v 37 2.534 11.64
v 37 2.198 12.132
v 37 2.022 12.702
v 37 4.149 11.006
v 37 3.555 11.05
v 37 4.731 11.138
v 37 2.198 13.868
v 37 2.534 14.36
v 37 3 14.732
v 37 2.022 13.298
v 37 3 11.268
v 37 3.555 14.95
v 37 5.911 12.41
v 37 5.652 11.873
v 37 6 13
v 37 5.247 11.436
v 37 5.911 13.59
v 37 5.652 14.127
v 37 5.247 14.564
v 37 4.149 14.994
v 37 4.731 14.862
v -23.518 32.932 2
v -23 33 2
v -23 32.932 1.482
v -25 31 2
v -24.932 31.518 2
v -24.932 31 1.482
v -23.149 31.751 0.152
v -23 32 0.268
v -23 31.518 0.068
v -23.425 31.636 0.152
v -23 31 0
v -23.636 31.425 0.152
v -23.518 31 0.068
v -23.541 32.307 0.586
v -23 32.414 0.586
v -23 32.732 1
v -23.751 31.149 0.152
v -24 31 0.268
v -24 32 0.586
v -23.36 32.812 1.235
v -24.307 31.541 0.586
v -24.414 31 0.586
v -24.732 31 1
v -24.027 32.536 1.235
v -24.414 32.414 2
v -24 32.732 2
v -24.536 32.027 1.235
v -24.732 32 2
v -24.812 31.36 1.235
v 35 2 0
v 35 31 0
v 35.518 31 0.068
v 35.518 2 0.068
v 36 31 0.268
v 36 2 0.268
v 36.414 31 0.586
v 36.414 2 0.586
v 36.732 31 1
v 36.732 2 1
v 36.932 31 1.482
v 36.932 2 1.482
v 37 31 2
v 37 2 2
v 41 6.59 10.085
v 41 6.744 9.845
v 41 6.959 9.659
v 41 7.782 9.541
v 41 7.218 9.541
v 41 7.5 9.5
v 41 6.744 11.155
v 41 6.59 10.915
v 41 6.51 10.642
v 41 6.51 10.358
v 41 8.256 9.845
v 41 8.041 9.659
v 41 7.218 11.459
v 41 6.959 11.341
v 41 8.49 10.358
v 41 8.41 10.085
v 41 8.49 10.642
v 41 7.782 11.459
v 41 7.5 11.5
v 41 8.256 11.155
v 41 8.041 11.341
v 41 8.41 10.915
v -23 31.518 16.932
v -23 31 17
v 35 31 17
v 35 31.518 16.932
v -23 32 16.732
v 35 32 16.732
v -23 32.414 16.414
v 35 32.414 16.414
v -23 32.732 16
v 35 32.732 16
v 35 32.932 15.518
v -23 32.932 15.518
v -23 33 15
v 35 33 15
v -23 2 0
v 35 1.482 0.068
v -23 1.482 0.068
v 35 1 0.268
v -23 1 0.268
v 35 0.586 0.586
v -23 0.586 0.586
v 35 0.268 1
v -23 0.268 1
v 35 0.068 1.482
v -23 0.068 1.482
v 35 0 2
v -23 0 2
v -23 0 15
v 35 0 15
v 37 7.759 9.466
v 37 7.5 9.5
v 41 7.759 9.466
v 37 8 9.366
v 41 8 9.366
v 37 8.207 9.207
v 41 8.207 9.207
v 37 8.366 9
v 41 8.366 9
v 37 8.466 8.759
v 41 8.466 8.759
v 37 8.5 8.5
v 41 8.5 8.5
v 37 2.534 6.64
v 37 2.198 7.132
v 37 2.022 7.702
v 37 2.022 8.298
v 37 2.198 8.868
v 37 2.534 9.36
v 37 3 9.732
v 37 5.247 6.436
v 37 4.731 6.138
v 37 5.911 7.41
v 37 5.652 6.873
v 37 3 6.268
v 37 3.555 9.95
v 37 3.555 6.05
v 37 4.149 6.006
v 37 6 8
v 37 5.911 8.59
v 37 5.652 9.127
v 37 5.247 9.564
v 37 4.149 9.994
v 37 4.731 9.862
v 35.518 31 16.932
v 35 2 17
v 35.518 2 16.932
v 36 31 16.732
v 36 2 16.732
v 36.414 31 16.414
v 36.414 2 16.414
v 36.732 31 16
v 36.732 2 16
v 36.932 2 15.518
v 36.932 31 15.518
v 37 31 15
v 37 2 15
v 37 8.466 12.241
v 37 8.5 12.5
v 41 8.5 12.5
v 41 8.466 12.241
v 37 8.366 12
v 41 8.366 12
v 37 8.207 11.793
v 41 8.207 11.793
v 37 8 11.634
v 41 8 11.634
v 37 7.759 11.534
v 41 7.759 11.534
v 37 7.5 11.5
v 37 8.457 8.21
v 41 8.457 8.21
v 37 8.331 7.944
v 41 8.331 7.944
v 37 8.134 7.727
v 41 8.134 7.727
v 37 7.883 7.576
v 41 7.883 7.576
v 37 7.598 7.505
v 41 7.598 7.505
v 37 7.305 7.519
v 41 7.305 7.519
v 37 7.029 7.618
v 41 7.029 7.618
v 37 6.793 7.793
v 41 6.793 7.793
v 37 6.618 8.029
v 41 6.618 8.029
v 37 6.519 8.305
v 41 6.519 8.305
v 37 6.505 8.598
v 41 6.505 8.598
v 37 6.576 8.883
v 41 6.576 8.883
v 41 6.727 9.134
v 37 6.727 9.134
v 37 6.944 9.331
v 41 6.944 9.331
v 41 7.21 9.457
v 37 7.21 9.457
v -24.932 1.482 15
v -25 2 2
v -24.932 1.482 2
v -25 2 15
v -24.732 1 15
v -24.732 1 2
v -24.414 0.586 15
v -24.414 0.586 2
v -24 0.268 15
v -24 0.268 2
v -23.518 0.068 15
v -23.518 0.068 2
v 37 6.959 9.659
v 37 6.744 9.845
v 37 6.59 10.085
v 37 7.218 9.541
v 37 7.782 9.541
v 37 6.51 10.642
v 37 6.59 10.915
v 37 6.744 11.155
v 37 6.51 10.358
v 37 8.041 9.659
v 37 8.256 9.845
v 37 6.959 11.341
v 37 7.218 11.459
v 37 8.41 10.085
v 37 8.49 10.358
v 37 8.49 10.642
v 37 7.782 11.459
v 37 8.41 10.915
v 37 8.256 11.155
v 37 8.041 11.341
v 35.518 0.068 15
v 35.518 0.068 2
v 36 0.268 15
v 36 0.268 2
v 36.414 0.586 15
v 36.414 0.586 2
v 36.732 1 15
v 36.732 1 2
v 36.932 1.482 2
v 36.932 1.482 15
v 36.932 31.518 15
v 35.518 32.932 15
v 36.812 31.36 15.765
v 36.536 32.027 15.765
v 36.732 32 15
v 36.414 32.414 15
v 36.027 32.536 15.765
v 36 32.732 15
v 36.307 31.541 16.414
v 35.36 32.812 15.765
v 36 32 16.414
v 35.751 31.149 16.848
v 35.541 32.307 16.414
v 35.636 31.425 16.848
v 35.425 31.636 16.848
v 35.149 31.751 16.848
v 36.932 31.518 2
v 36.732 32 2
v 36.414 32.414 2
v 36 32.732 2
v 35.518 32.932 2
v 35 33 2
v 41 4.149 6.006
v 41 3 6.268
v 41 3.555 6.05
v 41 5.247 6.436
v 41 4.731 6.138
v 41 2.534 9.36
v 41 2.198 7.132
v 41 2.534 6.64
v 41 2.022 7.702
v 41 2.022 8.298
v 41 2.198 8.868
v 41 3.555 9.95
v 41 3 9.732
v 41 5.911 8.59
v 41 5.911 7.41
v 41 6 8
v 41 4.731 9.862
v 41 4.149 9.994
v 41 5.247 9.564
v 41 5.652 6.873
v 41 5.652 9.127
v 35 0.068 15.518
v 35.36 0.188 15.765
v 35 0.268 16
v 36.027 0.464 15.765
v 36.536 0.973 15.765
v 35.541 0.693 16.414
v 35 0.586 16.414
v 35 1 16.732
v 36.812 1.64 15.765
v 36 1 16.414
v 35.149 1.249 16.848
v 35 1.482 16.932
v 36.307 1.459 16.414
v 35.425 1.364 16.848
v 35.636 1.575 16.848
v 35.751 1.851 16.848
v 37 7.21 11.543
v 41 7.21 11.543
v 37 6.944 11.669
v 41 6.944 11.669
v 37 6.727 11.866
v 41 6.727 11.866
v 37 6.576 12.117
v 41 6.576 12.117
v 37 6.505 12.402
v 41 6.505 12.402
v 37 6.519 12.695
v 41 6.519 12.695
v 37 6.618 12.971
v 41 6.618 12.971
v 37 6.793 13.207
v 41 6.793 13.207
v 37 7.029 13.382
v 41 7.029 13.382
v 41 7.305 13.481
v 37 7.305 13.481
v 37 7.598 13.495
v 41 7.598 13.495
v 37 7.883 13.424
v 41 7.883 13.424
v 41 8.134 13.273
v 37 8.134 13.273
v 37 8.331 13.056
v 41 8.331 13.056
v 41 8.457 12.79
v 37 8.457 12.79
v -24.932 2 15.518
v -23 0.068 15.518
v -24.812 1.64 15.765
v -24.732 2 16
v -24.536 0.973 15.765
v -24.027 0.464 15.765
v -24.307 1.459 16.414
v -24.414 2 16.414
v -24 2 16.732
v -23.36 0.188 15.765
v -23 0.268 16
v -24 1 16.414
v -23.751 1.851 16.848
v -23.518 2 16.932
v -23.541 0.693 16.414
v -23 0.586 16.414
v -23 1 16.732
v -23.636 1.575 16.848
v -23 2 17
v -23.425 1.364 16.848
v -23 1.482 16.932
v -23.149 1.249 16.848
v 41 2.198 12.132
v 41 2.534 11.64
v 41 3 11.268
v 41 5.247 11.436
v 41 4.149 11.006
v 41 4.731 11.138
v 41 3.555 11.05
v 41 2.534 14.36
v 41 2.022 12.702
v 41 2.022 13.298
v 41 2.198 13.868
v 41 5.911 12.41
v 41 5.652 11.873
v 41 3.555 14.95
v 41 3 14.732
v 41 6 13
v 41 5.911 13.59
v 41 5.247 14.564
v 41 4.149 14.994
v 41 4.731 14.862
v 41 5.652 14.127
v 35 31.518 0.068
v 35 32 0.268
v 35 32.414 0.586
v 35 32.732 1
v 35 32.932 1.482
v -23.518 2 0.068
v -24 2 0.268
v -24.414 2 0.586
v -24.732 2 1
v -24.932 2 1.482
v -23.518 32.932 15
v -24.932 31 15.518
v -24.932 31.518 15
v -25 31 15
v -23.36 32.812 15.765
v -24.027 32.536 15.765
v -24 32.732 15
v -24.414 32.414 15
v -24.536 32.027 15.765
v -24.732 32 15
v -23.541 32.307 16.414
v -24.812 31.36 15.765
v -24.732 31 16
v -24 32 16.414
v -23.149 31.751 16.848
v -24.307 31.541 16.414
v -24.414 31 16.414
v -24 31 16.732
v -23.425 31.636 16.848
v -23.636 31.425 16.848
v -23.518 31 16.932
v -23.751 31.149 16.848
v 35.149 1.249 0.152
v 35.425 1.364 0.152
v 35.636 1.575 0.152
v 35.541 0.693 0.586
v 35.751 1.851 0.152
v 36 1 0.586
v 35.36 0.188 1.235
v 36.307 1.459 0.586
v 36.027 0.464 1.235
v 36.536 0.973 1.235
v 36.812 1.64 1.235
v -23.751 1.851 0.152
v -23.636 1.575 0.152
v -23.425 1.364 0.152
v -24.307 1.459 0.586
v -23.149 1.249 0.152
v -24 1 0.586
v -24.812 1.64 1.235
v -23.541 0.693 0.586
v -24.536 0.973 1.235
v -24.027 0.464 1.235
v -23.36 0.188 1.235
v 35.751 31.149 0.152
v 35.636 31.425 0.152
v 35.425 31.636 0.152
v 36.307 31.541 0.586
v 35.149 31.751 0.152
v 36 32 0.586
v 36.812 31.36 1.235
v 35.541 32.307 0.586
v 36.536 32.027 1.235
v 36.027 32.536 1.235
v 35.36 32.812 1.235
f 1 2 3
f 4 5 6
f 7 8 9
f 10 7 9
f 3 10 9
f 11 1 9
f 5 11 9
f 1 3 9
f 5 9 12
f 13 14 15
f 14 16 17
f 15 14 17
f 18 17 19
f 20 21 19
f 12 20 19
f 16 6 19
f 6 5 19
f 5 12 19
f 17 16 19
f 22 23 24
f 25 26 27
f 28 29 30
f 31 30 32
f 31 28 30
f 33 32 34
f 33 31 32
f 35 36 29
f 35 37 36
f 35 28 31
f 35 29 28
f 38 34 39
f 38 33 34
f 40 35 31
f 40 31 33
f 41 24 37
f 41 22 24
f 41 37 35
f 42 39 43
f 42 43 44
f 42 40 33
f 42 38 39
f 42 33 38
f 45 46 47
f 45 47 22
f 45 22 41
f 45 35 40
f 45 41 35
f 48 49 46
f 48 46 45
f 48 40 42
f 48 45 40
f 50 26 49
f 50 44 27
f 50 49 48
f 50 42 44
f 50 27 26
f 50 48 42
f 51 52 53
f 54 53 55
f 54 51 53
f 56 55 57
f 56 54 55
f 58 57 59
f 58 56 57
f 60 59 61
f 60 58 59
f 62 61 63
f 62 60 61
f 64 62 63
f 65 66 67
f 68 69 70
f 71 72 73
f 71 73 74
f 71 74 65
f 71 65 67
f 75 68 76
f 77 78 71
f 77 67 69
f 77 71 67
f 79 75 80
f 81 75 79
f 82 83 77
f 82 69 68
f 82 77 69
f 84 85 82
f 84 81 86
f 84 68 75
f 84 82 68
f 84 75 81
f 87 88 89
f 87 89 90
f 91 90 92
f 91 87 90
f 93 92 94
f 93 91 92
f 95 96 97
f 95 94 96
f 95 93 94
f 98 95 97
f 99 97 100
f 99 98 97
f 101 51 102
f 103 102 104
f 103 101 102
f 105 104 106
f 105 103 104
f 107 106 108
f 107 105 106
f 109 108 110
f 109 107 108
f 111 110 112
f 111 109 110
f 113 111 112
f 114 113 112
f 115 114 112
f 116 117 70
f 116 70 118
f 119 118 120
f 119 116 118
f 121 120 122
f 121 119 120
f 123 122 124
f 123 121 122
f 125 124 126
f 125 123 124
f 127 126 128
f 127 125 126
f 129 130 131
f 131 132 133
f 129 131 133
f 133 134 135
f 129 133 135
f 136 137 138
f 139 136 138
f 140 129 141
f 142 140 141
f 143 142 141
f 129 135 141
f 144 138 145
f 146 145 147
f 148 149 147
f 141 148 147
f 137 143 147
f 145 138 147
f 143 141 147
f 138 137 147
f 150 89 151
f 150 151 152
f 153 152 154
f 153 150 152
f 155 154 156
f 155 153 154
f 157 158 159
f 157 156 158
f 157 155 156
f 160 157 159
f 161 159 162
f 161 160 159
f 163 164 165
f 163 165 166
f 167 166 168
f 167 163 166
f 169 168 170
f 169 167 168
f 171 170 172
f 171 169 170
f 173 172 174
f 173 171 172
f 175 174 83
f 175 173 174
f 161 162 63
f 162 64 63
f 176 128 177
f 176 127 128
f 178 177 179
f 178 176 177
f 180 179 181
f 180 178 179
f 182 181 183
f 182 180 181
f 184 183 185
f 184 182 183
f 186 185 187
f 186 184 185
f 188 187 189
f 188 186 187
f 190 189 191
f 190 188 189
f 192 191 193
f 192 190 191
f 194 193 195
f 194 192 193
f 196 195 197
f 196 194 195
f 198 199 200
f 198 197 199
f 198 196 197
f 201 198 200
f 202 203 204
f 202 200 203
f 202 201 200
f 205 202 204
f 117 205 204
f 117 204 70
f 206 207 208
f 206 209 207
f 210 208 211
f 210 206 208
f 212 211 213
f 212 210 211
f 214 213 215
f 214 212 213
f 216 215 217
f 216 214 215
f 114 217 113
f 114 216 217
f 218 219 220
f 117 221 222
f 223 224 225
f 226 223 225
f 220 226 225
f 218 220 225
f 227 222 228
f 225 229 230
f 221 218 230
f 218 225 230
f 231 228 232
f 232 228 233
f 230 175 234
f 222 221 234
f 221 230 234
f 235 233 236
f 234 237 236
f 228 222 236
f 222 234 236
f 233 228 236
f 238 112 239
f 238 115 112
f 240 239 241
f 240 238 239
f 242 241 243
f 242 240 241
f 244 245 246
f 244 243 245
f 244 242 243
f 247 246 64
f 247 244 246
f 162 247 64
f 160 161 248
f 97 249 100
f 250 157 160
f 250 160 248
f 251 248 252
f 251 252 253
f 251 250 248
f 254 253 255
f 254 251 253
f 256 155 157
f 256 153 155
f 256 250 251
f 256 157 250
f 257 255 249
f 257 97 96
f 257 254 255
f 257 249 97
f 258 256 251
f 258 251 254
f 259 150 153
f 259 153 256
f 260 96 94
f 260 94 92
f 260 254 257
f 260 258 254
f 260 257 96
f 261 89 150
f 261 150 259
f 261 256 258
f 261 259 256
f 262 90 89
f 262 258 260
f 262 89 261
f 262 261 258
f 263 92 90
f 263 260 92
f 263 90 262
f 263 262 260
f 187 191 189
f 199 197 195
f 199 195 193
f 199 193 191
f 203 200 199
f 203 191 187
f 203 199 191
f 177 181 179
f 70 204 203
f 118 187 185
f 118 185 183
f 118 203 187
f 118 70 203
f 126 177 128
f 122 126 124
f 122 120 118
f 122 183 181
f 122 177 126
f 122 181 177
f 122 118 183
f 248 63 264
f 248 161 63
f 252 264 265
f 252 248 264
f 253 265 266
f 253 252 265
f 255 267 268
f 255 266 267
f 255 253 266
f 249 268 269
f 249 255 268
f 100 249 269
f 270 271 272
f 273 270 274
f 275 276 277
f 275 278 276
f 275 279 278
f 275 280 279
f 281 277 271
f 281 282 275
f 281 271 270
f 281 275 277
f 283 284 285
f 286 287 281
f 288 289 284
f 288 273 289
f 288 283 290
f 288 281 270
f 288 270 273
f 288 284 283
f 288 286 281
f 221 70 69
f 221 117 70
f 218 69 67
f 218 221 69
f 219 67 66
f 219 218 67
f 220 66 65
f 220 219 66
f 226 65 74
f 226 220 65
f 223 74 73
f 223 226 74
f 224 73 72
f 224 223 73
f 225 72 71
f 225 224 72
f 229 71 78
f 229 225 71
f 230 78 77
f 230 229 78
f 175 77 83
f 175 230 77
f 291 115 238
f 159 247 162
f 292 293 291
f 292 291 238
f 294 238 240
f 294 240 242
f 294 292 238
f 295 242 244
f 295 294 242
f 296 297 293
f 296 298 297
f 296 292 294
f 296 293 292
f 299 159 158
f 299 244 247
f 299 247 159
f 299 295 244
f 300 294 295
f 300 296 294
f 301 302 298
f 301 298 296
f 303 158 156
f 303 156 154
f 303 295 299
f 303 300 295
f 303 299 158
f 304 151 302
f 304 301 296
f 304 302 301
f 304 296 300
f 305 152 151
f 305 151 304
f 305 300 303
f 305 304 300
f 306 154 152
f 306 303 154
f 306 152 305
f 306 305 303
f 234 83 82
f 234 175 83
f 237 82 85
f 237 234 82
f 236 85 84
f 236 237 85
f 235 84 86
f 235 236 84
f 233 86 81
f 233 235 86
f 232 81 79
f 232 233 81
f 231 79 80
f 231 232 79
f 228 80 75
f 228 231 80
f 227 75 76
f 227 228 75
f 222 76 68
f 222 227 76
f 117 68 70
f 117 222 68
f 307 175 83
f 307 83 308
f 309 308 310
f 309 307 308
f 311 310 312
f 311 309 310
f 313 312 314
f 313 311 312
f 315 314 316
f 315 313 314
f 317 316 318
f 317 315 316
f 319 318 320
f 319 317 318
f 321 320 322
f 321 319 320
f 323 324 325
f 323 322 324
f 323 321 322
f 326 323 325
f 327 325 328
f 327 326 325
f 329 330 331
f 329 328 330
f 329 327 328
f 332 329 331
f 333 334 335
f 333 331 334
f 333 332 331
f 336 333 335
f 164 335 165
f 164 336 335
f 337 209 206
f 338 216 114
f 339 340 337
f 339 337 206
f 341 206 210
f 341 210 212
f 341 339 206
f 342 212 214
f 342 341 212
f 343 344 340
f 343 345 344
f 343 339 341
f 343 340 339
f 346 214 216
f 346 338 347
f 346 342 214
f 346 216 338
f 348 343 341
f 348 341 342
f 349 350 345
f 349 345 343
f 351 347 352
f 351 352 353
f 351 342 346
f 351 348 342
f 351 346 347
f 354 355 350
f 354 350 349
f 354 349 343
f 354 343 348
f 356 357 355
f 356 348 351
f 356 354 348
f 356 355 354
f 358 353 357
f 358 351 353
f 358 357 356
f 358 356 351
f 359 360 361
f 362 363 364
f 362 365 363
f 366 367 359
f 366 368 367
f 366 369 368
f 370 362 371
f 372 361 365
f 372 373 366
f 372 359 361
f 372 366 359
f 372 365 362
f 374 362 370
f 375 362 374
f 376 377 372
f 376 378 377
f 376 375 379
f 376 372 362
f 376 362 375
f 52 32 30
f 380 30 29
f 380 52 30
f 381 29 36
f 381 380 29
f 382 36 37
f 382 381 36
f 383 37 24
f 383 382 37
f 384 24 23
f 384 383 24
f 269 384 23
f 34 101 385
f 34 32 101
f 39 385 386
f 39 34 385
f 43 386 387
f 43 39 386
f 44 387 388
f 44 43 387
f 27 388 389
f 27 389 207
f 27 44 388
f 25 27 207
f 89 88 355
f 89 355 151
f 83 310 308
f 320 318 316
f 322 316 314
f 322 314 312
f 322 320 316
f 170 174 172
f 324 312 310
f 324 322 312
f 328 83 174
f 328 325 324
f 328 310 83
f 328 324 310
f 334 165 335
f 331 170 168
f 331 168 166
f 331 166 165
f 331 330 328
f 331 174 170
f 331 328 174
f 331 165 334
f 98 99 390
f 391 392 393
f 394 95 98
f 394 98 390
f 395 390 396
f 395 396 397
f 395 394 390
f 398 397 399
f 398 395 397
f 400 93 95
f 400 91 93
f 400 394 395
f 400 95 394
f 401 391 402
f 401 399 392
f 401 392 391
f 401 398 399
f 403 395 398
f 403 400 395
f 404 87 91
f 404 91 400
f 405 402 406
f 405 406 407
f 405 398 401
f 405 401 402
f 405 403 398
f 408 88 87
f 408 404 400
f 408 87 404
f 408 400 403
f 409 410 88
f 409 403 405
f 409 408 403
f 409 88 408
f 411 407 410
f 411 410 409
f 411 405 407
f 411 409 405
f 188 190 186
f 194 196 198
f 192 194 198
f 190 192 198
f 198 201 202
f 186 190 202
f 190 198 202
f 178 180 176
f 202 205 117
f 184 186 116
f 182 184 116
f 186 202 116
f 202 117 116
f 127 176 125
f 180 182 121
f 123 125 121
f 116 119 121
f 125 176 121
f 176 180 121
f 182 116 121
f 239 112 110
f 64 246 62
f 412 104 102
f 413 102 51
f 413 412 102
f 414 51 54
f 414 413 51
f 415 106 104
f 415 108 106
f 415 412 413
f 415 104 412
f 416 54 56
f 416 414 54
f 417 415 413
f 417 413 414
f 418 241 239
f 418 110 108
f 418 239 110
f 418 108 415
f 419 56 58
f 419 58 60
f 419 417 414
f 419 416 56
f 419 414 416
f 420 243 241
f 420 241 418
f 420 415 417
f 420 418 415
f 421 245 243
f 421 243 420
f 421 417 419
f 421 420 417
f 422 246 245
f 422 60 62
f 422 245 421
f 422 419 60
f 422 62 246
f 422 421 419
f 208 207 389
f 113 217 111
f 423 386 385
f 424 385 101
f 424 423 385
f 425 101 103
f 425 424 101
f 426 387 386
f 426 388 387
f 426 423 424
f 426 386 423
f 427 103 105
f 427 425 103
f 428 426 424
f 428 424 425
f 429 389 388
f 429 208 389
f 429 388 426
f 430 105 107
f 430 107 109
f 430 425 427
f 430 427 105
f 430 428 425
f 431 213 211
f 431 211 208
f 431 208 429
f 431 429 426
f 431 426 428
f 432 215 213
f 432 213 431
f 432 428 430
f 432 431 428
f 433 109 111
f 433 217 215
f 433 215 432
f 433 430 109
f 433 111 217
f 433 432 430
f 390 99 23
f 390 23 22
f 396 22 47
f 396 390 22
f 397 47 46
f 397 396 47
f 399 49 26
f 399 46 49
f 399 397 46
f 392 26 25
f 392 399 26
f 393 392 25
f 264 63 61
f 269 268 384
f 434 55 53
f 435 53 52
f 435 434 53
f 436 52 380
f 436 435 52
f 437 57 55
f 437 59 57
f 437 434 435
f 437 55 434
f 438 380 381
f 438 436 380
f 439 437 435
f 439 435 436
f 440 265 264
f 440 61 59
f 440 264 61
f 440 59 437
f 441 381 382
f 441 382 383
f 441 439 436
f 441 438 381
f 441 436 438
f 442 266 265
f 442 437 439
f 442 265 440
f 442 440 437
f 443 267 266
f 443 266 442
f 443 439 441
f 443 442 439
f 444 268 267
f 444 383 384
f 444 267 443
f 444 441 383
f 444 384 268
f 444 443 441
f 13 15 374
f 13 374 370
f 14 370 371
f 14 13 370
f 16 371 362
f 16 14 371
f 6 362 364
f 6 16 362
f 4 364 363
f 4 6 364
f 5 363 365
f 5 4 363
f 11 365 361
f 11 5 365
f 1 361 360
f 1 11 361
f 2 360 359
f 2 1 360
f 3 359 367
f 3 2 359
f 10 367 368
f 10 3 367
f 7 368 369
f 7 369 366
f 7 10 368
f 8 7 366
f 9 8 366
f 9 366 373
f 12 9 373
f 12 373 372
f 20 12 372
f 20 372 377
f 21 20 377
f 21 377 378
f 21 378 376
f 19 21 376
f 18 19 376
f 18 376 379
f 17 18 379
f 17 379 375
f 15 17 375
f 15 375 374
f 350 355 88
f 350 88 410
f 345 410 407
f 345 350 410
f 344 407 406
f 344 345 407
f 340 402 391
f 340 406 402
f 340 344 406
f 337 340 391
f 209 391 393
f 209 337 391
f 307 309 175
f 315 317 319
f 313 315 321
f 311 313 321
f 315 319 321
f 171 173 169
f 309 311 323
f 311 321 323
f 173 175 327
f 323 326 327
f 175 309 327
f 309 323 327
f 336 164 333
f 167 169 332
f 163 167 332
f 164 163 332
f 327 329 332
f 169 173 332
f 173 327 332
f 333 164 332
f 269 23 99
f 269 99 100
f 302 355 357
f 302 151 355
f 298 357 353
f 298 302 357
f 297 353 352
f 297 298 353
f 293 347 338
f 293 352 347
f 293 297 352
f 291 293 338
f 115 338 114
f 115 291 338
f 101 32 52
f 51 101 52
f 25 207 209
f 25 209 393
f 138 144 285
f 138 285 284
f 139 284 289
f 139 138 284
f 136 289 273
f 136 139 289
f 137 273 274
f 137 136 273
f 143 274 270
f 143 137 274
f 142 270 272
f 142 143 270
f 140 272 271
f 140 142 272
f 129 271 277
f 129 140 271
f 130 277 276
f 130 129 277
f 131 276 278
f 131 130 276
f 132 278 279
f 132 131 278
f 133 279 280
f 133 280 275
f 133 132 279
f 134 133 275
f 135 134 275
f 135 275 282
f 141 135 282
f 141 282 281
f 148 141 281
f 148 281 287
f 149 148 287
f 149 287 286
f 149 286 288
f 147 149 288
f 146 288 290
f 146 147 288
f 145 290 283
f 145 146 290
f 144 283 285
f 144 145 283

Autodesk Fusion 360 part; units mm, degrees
sketch "Sketch1" plane through (0, 0, 0) normal (0, 0, 1) x (1, 0, 0)
  line L0 (-25, 0) -> (-25, 33)
  line L1 (-25, 33) -> (37, 33)
  line L2 (-25, 0) -> (37, 0)
  line L3 (37, 0) -> (37, 33)
  dimension "d1" = 33
  dimension "d2" = 62
  dimension "d3" = 62
extrude "Extrude1" add sketch "Sketch1" along normal blind 17 makes body 1
fillet "Fillet1" radius 2 4 edges at (-25, 0, 8.5) (-25, 33, 8.5) (37, 0, 8.5) (37, 33, 8.5) on bodies 1
fillet "Fillet2" radius 2 16 edges at (-24.4142, 0.5858, 17) (6, 0, 17) (36.4142, 0.5858, 17) (37, 16.5, 17) (36.4142, 32.4142, 17) (6, 33, 17) (-24.4142, 32.4142, 17) (-25, 16.5, 17) (-24.4142, 32.4142, 0) (6, 33, 0) (36.4142, 32.4142, 0) (37, 16.5, 0) (36.4142, 0.5858, 0) (6, 0, 0) (-24.4142, 0.5858, 0) (-25, 16.5, 0) on bodies 1
sketch "Sketch2" plane through (37, 0, 0) normal (1, 0, 0) x (0, 1, 0)
  line L0 (2, 2) -> (31, 2)
  line L1 (31, 2) -> (31, 15)
  line L2 (31, 15) -> (2, 15)
  line L3 (2, 15) -> (2, 2)
  circle A0 centre (4, 13) radius 2
  circle A1 centre (4, 8) radius 2
  circle A2 centre (7.5, 12.5) radius 1
  circle A3 centre (7.5, 10.5) radius 1
  circle A4 centre (7.5, 8.5) radius 1
extrude "Extrude2" add sketch "Sketch2" along normal blind 4 separate body contours A1 | A0 | A2 | A4 | A3 makes body 2 at (39.6667, 5.9901, 13.1991) makes body 3 at (39.6667, 5.9901, 8.1991) makes body 4 at (39.6667, 7.4502, 9.5012)
